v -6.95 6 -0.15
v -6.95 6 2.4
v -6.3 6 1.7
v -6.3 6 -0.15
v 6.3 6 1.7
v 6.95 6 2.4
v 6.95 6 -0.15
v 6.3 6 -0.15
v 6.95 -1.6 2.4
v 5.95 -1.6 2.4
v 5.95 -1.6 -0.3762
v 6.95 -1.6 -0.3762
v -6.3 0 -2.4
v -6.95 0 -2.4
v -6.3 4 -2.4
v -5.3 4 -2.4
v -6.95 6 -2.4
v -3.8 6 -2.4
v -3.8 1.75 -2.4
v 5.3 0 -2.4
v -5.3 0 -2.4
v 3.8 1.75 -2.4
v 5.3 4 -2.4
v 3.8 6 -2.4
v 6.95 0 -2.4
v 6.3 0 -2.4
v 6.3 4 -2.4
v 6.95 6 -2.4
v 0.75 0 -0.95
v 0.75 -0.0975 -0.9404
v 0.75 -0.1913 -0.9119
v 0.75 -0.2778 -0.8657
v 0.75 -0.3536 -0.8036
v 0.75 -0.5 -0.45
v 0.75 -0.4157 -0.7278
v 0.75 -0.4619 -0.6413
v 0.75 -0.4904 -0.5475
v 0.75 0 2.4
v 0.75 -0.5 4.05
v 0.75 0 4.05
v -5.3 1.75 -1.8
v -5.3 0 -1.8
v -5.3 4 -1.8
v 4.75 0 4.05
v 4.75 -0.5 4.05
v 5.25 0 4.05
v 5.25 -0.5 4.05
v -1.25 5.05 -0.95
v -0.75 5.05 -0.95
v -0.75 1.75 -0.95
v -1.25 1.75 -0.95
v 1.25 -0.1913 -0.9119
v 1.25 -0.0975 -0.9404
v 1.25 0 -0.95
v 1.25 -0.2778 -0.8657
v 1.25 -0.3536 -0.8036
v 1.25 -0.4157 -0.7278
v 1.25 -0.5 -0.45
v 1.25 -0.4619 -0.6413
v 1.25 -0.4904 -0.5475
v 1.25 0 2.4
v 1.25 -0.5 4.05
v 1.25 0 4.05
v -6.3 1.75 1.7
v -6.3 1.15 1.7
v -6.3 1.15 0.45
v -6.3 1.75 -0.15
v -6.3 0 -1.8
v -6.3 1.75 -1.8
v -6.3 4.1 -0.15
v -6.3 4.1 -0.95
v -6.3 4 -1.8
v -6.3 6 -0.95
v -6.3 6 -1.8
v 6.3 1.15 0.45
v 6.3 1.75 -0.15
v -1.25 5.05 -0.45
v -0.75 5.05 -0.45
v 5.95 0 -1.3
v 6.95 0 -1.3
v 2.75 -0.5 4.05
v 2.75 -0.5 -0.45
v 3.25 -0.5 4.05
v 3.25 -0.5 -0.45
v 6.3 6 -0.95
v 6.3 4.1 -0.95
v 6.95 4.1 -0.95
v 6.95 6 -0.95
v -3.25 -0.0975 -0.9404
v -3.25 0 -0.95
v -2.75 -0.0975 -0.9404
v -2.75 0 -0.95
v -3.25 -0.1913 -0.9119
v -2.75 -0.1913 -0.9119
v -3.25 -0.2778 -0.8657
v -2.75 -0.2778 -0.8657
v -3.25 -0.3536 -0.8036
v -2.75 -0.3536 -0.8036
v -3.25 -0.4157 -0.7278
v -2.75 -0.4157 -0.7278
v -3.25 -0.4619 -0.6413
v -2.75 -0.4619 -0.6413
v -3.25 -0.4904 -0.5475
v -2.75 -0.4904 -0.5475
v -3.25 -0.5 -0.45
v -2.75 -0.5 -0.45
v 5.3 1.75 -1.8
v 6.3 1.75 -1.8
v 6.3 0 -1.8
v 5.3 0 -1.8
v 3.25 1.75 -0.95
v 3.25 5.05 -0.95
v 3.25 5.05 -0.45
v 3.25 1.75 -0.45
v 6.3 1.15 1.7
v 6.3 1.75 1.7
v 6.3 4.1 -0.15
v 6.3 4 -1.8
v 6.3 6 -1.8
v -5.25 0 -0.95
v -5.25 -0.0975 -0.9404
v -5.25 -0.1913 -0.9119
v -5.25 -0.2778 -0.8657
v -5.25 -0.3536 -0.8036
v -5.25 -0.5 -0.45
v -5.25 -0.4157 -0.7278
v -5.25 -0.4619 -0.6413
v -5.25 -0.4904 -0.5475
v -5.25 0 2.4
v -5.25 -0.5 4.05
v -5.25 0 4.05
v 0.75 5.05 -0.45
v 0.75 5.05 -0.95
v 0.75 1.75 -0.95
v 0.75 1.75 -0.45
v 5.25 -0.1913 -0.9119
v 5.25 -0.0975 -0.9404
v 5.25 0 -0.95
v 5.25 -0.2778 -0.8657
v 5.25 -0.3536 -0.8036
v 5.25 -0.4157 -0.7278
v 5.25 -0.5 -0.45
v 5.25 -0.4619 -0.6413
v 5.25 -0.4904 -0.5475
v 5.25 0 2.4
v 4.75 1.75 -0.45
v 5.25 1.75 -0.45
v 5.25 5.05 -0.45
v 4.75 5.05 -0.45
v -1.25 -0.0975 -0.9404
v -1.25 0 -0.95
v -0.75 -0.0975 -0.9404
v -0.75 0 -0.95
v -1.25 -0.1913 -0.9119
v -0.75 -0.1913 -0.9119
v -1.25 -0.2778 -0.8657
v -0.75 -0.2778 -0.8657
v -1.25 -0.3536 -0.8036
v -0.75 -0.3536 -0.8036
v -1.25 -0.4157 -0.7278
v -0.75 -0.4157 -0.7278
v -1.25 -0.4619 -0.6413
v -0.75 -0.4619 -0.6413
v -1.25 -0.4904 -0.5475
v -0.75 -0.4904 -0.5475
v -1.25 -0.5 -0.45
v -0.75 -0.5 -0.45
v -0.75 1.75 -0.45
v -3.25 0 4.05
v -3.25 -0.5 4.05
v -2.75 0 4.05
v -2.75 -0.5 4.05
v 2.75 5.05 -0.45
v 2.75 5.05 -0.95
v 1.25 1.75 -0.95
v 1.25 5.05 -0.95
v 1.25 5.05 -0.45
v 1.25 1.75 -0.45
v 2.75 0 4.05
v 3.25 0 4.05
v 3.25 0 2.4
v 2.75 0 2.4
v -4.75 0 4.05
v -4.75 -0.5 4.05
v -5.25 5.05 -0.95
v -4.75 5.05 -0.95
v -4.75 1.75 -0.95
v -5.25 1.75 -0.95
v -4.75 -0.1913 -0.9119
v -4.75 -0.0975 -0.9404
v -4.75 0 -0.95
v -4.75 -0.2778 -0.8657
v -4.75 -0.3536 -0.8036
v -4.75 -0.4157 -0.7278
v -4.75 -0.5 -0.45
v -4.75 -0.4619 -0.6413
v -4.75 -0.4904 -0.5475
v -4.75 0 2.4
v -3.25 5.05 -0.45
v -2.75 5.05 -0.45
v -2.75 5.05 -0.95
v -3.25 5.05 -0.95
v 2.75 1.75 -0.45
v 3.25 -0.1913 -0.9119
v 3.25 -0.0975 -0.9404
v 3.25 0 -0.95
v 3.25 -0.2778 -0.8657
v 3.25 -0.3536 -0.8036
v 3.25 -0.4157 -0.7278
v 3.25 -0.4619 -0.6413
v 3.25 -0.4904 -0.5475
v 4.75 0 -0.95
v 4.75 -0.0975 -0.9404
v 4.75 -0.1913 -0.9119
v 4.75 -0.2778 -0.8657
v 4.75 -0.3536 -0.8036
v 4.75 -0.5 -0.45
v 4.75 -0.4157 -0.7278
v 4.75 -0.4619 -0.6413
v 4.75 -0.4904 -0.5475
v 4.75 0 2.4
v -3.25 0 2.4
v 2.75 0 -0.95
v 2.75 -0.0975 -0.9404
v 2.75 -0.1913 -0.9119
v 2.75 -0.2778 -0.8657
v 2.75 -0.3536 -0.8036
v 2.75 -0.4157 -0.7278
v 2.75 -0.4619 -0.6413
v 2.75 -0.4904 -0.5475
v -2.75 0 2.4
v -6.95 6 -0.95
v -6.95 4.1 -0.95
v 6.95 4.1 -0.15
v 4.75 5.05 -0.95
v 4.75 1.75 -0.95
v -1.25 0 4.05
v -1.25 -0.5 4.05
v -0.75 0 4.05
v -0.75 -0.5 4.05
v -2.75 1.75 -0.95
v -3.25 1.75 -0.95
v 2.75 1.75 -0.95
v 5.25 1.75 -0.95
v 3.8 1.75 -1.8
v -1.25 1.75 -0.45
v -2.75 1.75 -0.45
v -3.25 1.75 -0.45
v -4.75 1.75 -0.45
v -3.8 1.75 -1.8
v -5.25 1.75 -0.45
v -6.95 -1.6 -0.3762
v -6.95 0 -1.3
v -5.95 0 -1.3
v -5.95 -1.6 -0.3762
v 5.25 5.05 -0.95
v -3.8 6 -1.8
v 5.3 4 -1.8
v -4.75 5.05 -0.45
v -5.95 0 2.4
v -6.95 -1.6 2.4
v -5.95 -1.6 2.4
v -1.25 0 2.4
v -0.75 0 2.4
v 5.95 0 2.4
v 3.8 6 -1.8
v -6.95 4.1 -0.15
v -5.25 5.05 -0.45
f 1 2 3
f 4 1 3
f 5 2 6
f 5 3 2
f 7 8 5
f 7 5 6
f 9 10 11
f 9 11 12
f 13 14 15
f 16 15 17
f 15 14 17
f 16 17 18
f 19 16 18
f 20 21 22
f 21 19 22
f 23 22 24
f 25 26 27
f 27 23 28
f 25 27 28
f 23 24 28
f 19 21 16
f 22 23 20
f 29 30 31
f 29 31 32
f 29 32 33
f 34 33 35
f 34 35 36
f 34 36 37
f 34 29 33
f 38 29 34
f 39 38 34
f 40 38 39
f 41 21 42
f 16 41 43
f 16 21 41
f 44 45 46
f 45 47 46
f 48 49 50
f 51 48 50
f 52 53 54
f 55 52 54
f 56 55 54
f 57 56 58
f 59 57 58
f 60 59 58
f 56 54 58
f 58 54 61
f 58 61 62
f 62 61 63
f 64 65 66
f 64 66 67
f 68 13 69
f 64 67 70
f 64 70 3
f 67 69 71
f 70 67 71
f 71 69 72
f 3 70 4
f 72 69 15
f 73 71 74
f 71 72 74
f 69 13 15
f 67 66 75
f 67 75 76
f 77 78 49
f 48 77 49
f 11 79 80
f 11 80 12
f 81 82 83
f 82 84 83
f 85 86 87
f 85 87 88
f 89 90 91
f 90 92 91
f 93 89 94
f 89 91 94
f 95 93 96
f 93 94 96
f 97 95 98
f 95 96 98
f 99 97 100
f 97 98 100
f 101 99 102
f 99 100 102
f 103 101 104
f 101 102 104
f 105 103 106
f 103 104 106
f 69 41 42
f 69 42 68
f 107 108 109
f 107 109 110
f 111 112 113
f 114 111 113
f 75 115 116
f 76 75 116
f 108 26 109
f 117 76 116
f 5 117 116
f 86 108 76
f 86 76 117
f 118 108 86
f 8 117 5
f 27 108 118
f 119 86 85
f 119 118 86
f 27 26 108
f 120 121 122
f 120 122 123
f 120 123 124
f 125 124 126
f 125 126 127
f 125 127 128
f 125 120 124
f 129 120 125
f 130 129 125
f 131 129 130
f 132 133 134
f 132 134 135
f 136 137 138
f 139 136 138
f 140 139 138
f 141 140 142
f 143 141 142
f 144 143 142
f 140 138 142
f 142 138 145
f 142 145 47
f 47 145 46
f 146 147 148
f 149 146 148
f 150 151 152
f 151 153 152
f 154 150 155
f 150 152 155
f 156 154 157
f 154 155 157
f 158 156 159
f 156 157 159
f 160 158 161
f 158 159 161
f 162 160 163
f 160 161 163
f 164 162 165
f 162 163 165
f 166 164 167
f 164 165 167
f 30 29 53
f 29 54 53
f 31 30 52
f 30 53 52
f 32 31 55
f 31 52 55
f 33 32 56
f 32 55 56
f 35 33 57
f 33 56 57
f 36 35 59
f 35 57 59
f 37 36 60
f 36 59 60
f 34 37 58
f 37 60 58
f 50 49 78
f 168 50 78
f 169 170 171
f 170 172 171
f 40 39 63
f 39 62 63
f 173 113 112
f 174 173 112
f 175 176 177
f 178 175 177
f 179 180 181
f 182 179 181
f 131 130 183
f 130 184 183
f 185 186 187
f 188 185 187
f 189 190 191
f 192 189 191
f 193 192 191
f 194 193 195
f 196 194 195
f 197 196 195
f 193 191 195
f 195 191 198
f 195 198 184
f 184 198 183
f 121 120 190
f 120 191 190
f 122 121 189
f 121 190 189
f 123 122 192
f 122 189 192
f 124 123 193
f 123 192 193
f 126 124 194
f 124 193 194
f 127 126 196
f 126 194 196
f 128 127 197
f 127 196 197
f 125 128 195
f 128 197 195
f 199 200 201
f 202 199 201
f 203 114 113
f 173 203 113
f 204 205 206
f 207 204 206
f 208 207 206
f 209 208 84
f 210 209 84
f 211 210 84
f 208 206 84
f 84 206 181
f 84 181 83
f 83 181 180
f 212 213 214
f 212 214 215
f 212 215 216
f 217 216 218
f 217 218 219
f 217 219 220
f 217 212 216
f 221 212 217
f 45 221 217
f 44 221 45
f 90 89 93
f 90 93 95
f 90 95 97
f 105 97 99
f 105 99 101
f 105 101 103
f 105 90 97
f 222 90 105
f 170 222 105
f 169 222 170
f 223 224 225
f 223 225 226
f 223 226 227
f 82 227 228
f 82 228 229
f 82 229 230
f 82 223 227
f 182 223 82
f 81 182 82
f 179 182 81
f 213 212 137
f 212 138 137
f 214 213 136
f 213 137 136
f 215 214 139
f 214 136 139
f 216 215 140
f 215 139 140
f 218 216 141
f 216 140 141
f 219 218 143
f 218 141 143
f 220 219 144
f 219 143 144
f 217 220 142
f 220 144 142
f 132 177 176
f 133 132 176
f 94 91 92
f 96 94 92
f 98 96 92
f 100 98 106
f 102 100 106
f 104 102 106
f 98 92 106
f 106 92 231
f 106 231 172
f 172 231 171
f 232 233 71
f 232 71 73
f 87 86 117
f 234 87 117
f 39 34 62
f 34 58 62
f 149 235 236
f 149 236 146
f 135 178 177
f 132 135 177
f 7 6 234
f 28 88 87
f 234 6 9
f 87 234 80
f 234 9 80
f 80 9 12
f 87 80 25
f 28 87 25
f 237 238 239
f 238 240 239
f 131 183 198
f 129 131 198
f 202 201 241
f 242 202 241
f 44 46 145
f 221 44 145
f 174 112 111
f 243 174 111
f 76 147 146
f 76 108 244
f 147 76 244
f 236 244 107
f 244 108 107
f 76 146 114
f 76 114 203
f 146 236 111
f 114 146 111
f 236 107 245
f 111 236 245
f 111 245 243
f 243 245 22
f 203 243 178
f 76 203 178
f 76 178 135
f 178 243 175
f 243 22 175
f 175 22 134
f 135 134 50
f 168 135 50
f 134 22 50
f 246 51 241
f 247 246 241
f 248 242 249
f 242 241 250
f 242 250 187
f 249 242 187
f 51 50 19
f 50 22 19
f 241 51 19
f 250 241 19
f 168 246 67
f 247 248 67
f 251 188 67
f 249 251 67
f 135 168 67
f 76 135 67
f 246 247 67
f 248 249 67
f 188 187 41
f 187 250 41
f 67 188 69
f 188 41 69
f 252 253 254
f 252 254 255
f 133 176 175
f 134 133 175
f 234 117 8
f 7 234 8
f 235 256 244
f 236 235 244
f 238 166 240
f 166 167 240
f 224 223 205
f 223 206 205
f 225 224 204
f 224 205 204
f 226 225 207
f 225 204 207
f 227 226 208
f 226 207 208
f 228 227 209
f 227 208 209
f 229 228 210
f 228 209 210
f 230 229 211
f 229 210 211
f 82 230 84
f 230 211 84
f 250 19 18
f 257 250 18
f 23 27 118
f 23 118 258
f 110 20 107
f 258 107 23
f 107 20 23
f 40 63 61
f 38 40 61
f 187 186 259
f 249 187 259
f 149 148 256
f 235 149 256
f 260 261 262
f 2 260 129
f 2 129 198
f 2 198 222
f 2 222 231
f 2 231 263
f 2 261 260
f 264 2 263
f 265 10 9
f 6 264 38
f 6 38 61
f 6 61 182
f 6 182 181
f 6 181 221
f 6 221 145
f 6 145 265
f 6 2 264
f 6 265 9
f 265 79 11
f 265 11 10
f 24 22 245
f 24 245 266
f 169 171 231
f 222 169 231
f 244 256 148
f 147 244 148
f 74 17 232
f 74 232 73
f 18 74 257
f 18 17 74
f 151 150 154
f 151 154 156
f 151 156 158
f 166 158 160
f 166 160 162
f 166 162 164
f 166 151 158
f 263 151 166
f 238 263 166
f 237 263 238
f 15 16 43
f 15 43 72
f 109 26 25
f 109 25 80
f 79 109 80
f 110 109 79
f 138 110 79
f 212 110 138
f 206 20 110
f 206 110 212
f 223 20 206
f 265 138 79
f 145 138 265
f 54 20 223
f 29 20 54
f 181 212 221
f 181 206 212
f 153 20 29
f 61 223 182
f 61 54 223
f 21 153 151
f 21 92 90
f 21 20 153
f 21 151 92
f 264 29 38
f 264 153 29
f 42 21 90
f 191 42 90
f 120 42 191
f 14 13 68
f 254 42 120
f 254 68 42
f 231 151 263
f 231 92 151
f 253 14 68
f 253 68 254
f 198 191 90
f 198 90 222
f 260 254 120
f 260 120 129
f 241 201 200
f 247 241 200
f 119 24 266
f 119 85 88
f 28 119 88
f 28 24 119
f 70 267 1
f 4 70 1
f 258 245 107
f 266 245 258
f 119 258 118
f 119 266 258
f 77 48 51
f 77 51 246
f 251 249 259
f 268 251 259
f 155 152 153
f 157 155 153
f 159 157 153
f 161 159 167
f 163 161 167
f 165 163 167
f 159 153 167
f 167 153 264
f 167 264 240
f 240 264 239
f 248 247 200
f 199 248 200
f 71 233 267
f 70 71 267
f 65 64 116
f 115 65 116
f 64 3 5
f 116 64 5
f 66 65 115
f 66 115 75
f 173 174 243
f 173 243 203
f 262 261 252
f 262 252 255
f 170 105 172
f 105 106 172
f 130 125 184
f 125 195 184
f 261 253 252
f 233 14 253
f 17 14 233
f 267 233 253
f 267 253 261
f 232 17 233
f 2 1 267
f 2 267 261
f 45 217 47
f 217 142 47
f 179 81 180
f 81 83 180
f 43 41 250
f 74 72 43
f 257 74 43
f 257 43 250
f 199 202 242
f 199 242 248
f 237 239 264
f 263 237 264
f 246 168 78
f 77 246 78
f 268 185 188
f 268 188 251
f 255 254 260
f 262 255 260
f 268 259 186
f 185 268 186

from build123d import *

# Parameters (mm, degrees)
SKETCH1_W           = 13.9
SKETCH1_H           = 4.8
BOSS_EXTRUDE1_DEPTH = 6
SKETCH2_W           = 12.6
SKETCH2_H           = 3.500000001
CUT_EXTRUDE1_DEPTH  = 4.25
SKETCH4_W           = 1
SKETCH4_H           = 4.8
BOSS_EXTRUDE2_DEPTH = 1.6
SKETCH5_W           = 0.8
SKETCH5_H           = 1.9
CUT_EXTRUDE3_DEPTH  = 16.328731193
SKETCH3_W           = 1
SKETCH3_H           = 4.000000001
SKETCH3_W_2         = 7.6
SKETCH3_H_2         = 4.25
CUT_EXTRUDE2_DEPTH  = 0.599999999
CUT_EXTRUDE4_START  = -6.3
CUT_EXTRUDE4_DEPTH  = 12.6
BOSS_EXTRUDE3_START = 5
BOSS_EXTRUDE3_DEPTH = 0.25
LPATTERN1_COUNT     = 6
LPATTERN1_PITCH     = 2


with BuildPart() as part:
    # Sketch1 → Boss-Extrude1 (new body)
    with BuildSketch(Plane(origin=(0, 0, 0), x_dir=(1, 0, 0), z_dir=(0, 1, 0))):
        Rectangle(SKETCH1_W, SKETCH1_H)
    extrude(amount=BOSS_EXTRUDE1_DEPTH)

    # Sketch2 → Cut-Extrude1 (cut)
    with BuildSketch(Plane(origin=(0, 6, 0), x_dir=(1, 0, 0), z_dir=(0, 1, 0))):
        with Locations((0, 0.05)):
            Rectangle(SKETCH2_W, SKETCH2_H)
    extrude(amount=-CUT_EXTRUDE1_DEPTH, mode=Mode.SUBTRACT)

    # Sketch4 → Boss-Extrude2 (add)
    with BuildSketch(Plane.XZ):
        with Locations((-6.45, 0)):
            Rectangle(SKETCH4_W, SKETCH4_H)
        with Locations((6.45, 0)):
            Rectangle(SKETCH4_W, SKETCH4_H)
    extrude(amount=BOSS_EXTRUDE2_DEPTH)

    # Sketch5 → Cut-Extrude3 (cut, through all)
    with BuildSketch(Plane.ZY.offset(6.95)):
        Polygon((-2.4, 0), (-1.3, 0), (-0.376239569, -1.6), (-2.4, -1.6), align=None)
        with Locations((-0.55, 5.05)):
            Rectangle(SKETCH5_W, SKETCH5_H)
    extrude(amount=-CUT_EXTRUDE3_DEPTH, mode=Mode.SUBTRACT)

    # Sketch3 → Cut-Extrude2 (cut)
    with BuildSketch(Plane(origin=(0, 0, -2.4), x_dir=(-1, 0, 0), z_dir=(0, 0, -1))):
        with Locations((-5.8, 2.000000001)):
            Rectangle(SKETCH3_W, SKETCH3_H)
        with Locations((0, 3.875)):
            Rectangle(SKETCH3_W_2, SKETCH3_H_2)
        with Locations((5.8, 2.000000001)):
            Rectangle(SKETCH3_W, SKETCH3_H)
    extrude(amount=-CUT_EXTRUDE2_DEPTH, mode=Mode.SUBTRACT)

    # Sketch6 → Cut-Extrude4 (cut)
    with BuildSketch(Plane(origin=(0, 0, 0), x_dir=(0, 0, -1), z_dir=(1, 0, 0)).offset(CUT_EXTRUDE4_START)):
        Polygon((0.15, 1.75), (-1.7, 1.75), (-1.7, 1.15), (-0.45, 1.15), align=None)
    extrude(amount=CUT_EXTRUDE4_DEPTH, mode=Mode.SUBTRACT)


with BuildPart() as body_2:
    # Sketch7 → Boss-Extrude3 (new, symmetric)
    with BuildSketch(Plane(origin=(0, 0, 0), x_dir=(0, 0, -1), z_dir=(1, 0, 0)).offset(BOSS_EXTRUDE3_START)):
        with BuildLine():
            Line((0.45, 5.05), (0.95, 5.05))
            Line((0.95, 5.05), (0.95, 0))
            ThreePointArc((0.95, 0), (0.803553391, -0.353553391), (0.45, -0.5))
            Line((0.45, -0.5), (-4.05, -0.5))
            Line((-4.05, -0.5), (-4.05, 0))
            Line((-4.05, 0), (0.45, 0))
            Line((0.45, 0), (0.45, 5.05))
        make_face()
    extrude(amount=BOSS_EXTRUDE3_DEPTH, both=True)


with BuildPart() as lpattern1_1:
    # LPattern1: pattern copy
    add(body_2.part.moved(Location(Vector(-1, 0, 0) * (1 * LPATTERN1_PITCH))))


with BuildPart() as lpattern1_2:
    # LPattern1: pattern copy
    add(body_2.part.moved(Location(Vector(-1, 0, 0) * (2 * LPATTERN1_PITCH))))


with BuildPart() as lpattern1_3:
    # LPattern1: pattern copy
    add(body_2.part.moved(Location(Vector(-1, 0, 0) * (3 * LPATTERN1_PITCH))))


with BuildPart() as lpattern1_4:
    # LPattern1: pattern copy
    add(body_2.part.moved(Location(Vector(-1, 0, 0) * (4 * LPATTERN1_PITCH))))


with BuildPart() as lpattern1_5:
    # LPattern1: pattern copy
    add(body_2.part.moved(Location(Vector(-1, 0, 0) * (5 * LPATTERN1_PITCH))))


with BuildPart() as lpattern1_4_1:
    add(lpattern1_4.part)

    # Combine1: union body 2, LPattern1_2, LPattern1_5, part, LPattern1_3, LPattern1_1
    add(body_2.part)
    add(lpattern1_2.part)
    add(lpattern1_5.part)
    add(part.part)
    add(lpattern1_3.part)
    add(lpattern1_1.part)


solid = lpattern1_4_1.part
